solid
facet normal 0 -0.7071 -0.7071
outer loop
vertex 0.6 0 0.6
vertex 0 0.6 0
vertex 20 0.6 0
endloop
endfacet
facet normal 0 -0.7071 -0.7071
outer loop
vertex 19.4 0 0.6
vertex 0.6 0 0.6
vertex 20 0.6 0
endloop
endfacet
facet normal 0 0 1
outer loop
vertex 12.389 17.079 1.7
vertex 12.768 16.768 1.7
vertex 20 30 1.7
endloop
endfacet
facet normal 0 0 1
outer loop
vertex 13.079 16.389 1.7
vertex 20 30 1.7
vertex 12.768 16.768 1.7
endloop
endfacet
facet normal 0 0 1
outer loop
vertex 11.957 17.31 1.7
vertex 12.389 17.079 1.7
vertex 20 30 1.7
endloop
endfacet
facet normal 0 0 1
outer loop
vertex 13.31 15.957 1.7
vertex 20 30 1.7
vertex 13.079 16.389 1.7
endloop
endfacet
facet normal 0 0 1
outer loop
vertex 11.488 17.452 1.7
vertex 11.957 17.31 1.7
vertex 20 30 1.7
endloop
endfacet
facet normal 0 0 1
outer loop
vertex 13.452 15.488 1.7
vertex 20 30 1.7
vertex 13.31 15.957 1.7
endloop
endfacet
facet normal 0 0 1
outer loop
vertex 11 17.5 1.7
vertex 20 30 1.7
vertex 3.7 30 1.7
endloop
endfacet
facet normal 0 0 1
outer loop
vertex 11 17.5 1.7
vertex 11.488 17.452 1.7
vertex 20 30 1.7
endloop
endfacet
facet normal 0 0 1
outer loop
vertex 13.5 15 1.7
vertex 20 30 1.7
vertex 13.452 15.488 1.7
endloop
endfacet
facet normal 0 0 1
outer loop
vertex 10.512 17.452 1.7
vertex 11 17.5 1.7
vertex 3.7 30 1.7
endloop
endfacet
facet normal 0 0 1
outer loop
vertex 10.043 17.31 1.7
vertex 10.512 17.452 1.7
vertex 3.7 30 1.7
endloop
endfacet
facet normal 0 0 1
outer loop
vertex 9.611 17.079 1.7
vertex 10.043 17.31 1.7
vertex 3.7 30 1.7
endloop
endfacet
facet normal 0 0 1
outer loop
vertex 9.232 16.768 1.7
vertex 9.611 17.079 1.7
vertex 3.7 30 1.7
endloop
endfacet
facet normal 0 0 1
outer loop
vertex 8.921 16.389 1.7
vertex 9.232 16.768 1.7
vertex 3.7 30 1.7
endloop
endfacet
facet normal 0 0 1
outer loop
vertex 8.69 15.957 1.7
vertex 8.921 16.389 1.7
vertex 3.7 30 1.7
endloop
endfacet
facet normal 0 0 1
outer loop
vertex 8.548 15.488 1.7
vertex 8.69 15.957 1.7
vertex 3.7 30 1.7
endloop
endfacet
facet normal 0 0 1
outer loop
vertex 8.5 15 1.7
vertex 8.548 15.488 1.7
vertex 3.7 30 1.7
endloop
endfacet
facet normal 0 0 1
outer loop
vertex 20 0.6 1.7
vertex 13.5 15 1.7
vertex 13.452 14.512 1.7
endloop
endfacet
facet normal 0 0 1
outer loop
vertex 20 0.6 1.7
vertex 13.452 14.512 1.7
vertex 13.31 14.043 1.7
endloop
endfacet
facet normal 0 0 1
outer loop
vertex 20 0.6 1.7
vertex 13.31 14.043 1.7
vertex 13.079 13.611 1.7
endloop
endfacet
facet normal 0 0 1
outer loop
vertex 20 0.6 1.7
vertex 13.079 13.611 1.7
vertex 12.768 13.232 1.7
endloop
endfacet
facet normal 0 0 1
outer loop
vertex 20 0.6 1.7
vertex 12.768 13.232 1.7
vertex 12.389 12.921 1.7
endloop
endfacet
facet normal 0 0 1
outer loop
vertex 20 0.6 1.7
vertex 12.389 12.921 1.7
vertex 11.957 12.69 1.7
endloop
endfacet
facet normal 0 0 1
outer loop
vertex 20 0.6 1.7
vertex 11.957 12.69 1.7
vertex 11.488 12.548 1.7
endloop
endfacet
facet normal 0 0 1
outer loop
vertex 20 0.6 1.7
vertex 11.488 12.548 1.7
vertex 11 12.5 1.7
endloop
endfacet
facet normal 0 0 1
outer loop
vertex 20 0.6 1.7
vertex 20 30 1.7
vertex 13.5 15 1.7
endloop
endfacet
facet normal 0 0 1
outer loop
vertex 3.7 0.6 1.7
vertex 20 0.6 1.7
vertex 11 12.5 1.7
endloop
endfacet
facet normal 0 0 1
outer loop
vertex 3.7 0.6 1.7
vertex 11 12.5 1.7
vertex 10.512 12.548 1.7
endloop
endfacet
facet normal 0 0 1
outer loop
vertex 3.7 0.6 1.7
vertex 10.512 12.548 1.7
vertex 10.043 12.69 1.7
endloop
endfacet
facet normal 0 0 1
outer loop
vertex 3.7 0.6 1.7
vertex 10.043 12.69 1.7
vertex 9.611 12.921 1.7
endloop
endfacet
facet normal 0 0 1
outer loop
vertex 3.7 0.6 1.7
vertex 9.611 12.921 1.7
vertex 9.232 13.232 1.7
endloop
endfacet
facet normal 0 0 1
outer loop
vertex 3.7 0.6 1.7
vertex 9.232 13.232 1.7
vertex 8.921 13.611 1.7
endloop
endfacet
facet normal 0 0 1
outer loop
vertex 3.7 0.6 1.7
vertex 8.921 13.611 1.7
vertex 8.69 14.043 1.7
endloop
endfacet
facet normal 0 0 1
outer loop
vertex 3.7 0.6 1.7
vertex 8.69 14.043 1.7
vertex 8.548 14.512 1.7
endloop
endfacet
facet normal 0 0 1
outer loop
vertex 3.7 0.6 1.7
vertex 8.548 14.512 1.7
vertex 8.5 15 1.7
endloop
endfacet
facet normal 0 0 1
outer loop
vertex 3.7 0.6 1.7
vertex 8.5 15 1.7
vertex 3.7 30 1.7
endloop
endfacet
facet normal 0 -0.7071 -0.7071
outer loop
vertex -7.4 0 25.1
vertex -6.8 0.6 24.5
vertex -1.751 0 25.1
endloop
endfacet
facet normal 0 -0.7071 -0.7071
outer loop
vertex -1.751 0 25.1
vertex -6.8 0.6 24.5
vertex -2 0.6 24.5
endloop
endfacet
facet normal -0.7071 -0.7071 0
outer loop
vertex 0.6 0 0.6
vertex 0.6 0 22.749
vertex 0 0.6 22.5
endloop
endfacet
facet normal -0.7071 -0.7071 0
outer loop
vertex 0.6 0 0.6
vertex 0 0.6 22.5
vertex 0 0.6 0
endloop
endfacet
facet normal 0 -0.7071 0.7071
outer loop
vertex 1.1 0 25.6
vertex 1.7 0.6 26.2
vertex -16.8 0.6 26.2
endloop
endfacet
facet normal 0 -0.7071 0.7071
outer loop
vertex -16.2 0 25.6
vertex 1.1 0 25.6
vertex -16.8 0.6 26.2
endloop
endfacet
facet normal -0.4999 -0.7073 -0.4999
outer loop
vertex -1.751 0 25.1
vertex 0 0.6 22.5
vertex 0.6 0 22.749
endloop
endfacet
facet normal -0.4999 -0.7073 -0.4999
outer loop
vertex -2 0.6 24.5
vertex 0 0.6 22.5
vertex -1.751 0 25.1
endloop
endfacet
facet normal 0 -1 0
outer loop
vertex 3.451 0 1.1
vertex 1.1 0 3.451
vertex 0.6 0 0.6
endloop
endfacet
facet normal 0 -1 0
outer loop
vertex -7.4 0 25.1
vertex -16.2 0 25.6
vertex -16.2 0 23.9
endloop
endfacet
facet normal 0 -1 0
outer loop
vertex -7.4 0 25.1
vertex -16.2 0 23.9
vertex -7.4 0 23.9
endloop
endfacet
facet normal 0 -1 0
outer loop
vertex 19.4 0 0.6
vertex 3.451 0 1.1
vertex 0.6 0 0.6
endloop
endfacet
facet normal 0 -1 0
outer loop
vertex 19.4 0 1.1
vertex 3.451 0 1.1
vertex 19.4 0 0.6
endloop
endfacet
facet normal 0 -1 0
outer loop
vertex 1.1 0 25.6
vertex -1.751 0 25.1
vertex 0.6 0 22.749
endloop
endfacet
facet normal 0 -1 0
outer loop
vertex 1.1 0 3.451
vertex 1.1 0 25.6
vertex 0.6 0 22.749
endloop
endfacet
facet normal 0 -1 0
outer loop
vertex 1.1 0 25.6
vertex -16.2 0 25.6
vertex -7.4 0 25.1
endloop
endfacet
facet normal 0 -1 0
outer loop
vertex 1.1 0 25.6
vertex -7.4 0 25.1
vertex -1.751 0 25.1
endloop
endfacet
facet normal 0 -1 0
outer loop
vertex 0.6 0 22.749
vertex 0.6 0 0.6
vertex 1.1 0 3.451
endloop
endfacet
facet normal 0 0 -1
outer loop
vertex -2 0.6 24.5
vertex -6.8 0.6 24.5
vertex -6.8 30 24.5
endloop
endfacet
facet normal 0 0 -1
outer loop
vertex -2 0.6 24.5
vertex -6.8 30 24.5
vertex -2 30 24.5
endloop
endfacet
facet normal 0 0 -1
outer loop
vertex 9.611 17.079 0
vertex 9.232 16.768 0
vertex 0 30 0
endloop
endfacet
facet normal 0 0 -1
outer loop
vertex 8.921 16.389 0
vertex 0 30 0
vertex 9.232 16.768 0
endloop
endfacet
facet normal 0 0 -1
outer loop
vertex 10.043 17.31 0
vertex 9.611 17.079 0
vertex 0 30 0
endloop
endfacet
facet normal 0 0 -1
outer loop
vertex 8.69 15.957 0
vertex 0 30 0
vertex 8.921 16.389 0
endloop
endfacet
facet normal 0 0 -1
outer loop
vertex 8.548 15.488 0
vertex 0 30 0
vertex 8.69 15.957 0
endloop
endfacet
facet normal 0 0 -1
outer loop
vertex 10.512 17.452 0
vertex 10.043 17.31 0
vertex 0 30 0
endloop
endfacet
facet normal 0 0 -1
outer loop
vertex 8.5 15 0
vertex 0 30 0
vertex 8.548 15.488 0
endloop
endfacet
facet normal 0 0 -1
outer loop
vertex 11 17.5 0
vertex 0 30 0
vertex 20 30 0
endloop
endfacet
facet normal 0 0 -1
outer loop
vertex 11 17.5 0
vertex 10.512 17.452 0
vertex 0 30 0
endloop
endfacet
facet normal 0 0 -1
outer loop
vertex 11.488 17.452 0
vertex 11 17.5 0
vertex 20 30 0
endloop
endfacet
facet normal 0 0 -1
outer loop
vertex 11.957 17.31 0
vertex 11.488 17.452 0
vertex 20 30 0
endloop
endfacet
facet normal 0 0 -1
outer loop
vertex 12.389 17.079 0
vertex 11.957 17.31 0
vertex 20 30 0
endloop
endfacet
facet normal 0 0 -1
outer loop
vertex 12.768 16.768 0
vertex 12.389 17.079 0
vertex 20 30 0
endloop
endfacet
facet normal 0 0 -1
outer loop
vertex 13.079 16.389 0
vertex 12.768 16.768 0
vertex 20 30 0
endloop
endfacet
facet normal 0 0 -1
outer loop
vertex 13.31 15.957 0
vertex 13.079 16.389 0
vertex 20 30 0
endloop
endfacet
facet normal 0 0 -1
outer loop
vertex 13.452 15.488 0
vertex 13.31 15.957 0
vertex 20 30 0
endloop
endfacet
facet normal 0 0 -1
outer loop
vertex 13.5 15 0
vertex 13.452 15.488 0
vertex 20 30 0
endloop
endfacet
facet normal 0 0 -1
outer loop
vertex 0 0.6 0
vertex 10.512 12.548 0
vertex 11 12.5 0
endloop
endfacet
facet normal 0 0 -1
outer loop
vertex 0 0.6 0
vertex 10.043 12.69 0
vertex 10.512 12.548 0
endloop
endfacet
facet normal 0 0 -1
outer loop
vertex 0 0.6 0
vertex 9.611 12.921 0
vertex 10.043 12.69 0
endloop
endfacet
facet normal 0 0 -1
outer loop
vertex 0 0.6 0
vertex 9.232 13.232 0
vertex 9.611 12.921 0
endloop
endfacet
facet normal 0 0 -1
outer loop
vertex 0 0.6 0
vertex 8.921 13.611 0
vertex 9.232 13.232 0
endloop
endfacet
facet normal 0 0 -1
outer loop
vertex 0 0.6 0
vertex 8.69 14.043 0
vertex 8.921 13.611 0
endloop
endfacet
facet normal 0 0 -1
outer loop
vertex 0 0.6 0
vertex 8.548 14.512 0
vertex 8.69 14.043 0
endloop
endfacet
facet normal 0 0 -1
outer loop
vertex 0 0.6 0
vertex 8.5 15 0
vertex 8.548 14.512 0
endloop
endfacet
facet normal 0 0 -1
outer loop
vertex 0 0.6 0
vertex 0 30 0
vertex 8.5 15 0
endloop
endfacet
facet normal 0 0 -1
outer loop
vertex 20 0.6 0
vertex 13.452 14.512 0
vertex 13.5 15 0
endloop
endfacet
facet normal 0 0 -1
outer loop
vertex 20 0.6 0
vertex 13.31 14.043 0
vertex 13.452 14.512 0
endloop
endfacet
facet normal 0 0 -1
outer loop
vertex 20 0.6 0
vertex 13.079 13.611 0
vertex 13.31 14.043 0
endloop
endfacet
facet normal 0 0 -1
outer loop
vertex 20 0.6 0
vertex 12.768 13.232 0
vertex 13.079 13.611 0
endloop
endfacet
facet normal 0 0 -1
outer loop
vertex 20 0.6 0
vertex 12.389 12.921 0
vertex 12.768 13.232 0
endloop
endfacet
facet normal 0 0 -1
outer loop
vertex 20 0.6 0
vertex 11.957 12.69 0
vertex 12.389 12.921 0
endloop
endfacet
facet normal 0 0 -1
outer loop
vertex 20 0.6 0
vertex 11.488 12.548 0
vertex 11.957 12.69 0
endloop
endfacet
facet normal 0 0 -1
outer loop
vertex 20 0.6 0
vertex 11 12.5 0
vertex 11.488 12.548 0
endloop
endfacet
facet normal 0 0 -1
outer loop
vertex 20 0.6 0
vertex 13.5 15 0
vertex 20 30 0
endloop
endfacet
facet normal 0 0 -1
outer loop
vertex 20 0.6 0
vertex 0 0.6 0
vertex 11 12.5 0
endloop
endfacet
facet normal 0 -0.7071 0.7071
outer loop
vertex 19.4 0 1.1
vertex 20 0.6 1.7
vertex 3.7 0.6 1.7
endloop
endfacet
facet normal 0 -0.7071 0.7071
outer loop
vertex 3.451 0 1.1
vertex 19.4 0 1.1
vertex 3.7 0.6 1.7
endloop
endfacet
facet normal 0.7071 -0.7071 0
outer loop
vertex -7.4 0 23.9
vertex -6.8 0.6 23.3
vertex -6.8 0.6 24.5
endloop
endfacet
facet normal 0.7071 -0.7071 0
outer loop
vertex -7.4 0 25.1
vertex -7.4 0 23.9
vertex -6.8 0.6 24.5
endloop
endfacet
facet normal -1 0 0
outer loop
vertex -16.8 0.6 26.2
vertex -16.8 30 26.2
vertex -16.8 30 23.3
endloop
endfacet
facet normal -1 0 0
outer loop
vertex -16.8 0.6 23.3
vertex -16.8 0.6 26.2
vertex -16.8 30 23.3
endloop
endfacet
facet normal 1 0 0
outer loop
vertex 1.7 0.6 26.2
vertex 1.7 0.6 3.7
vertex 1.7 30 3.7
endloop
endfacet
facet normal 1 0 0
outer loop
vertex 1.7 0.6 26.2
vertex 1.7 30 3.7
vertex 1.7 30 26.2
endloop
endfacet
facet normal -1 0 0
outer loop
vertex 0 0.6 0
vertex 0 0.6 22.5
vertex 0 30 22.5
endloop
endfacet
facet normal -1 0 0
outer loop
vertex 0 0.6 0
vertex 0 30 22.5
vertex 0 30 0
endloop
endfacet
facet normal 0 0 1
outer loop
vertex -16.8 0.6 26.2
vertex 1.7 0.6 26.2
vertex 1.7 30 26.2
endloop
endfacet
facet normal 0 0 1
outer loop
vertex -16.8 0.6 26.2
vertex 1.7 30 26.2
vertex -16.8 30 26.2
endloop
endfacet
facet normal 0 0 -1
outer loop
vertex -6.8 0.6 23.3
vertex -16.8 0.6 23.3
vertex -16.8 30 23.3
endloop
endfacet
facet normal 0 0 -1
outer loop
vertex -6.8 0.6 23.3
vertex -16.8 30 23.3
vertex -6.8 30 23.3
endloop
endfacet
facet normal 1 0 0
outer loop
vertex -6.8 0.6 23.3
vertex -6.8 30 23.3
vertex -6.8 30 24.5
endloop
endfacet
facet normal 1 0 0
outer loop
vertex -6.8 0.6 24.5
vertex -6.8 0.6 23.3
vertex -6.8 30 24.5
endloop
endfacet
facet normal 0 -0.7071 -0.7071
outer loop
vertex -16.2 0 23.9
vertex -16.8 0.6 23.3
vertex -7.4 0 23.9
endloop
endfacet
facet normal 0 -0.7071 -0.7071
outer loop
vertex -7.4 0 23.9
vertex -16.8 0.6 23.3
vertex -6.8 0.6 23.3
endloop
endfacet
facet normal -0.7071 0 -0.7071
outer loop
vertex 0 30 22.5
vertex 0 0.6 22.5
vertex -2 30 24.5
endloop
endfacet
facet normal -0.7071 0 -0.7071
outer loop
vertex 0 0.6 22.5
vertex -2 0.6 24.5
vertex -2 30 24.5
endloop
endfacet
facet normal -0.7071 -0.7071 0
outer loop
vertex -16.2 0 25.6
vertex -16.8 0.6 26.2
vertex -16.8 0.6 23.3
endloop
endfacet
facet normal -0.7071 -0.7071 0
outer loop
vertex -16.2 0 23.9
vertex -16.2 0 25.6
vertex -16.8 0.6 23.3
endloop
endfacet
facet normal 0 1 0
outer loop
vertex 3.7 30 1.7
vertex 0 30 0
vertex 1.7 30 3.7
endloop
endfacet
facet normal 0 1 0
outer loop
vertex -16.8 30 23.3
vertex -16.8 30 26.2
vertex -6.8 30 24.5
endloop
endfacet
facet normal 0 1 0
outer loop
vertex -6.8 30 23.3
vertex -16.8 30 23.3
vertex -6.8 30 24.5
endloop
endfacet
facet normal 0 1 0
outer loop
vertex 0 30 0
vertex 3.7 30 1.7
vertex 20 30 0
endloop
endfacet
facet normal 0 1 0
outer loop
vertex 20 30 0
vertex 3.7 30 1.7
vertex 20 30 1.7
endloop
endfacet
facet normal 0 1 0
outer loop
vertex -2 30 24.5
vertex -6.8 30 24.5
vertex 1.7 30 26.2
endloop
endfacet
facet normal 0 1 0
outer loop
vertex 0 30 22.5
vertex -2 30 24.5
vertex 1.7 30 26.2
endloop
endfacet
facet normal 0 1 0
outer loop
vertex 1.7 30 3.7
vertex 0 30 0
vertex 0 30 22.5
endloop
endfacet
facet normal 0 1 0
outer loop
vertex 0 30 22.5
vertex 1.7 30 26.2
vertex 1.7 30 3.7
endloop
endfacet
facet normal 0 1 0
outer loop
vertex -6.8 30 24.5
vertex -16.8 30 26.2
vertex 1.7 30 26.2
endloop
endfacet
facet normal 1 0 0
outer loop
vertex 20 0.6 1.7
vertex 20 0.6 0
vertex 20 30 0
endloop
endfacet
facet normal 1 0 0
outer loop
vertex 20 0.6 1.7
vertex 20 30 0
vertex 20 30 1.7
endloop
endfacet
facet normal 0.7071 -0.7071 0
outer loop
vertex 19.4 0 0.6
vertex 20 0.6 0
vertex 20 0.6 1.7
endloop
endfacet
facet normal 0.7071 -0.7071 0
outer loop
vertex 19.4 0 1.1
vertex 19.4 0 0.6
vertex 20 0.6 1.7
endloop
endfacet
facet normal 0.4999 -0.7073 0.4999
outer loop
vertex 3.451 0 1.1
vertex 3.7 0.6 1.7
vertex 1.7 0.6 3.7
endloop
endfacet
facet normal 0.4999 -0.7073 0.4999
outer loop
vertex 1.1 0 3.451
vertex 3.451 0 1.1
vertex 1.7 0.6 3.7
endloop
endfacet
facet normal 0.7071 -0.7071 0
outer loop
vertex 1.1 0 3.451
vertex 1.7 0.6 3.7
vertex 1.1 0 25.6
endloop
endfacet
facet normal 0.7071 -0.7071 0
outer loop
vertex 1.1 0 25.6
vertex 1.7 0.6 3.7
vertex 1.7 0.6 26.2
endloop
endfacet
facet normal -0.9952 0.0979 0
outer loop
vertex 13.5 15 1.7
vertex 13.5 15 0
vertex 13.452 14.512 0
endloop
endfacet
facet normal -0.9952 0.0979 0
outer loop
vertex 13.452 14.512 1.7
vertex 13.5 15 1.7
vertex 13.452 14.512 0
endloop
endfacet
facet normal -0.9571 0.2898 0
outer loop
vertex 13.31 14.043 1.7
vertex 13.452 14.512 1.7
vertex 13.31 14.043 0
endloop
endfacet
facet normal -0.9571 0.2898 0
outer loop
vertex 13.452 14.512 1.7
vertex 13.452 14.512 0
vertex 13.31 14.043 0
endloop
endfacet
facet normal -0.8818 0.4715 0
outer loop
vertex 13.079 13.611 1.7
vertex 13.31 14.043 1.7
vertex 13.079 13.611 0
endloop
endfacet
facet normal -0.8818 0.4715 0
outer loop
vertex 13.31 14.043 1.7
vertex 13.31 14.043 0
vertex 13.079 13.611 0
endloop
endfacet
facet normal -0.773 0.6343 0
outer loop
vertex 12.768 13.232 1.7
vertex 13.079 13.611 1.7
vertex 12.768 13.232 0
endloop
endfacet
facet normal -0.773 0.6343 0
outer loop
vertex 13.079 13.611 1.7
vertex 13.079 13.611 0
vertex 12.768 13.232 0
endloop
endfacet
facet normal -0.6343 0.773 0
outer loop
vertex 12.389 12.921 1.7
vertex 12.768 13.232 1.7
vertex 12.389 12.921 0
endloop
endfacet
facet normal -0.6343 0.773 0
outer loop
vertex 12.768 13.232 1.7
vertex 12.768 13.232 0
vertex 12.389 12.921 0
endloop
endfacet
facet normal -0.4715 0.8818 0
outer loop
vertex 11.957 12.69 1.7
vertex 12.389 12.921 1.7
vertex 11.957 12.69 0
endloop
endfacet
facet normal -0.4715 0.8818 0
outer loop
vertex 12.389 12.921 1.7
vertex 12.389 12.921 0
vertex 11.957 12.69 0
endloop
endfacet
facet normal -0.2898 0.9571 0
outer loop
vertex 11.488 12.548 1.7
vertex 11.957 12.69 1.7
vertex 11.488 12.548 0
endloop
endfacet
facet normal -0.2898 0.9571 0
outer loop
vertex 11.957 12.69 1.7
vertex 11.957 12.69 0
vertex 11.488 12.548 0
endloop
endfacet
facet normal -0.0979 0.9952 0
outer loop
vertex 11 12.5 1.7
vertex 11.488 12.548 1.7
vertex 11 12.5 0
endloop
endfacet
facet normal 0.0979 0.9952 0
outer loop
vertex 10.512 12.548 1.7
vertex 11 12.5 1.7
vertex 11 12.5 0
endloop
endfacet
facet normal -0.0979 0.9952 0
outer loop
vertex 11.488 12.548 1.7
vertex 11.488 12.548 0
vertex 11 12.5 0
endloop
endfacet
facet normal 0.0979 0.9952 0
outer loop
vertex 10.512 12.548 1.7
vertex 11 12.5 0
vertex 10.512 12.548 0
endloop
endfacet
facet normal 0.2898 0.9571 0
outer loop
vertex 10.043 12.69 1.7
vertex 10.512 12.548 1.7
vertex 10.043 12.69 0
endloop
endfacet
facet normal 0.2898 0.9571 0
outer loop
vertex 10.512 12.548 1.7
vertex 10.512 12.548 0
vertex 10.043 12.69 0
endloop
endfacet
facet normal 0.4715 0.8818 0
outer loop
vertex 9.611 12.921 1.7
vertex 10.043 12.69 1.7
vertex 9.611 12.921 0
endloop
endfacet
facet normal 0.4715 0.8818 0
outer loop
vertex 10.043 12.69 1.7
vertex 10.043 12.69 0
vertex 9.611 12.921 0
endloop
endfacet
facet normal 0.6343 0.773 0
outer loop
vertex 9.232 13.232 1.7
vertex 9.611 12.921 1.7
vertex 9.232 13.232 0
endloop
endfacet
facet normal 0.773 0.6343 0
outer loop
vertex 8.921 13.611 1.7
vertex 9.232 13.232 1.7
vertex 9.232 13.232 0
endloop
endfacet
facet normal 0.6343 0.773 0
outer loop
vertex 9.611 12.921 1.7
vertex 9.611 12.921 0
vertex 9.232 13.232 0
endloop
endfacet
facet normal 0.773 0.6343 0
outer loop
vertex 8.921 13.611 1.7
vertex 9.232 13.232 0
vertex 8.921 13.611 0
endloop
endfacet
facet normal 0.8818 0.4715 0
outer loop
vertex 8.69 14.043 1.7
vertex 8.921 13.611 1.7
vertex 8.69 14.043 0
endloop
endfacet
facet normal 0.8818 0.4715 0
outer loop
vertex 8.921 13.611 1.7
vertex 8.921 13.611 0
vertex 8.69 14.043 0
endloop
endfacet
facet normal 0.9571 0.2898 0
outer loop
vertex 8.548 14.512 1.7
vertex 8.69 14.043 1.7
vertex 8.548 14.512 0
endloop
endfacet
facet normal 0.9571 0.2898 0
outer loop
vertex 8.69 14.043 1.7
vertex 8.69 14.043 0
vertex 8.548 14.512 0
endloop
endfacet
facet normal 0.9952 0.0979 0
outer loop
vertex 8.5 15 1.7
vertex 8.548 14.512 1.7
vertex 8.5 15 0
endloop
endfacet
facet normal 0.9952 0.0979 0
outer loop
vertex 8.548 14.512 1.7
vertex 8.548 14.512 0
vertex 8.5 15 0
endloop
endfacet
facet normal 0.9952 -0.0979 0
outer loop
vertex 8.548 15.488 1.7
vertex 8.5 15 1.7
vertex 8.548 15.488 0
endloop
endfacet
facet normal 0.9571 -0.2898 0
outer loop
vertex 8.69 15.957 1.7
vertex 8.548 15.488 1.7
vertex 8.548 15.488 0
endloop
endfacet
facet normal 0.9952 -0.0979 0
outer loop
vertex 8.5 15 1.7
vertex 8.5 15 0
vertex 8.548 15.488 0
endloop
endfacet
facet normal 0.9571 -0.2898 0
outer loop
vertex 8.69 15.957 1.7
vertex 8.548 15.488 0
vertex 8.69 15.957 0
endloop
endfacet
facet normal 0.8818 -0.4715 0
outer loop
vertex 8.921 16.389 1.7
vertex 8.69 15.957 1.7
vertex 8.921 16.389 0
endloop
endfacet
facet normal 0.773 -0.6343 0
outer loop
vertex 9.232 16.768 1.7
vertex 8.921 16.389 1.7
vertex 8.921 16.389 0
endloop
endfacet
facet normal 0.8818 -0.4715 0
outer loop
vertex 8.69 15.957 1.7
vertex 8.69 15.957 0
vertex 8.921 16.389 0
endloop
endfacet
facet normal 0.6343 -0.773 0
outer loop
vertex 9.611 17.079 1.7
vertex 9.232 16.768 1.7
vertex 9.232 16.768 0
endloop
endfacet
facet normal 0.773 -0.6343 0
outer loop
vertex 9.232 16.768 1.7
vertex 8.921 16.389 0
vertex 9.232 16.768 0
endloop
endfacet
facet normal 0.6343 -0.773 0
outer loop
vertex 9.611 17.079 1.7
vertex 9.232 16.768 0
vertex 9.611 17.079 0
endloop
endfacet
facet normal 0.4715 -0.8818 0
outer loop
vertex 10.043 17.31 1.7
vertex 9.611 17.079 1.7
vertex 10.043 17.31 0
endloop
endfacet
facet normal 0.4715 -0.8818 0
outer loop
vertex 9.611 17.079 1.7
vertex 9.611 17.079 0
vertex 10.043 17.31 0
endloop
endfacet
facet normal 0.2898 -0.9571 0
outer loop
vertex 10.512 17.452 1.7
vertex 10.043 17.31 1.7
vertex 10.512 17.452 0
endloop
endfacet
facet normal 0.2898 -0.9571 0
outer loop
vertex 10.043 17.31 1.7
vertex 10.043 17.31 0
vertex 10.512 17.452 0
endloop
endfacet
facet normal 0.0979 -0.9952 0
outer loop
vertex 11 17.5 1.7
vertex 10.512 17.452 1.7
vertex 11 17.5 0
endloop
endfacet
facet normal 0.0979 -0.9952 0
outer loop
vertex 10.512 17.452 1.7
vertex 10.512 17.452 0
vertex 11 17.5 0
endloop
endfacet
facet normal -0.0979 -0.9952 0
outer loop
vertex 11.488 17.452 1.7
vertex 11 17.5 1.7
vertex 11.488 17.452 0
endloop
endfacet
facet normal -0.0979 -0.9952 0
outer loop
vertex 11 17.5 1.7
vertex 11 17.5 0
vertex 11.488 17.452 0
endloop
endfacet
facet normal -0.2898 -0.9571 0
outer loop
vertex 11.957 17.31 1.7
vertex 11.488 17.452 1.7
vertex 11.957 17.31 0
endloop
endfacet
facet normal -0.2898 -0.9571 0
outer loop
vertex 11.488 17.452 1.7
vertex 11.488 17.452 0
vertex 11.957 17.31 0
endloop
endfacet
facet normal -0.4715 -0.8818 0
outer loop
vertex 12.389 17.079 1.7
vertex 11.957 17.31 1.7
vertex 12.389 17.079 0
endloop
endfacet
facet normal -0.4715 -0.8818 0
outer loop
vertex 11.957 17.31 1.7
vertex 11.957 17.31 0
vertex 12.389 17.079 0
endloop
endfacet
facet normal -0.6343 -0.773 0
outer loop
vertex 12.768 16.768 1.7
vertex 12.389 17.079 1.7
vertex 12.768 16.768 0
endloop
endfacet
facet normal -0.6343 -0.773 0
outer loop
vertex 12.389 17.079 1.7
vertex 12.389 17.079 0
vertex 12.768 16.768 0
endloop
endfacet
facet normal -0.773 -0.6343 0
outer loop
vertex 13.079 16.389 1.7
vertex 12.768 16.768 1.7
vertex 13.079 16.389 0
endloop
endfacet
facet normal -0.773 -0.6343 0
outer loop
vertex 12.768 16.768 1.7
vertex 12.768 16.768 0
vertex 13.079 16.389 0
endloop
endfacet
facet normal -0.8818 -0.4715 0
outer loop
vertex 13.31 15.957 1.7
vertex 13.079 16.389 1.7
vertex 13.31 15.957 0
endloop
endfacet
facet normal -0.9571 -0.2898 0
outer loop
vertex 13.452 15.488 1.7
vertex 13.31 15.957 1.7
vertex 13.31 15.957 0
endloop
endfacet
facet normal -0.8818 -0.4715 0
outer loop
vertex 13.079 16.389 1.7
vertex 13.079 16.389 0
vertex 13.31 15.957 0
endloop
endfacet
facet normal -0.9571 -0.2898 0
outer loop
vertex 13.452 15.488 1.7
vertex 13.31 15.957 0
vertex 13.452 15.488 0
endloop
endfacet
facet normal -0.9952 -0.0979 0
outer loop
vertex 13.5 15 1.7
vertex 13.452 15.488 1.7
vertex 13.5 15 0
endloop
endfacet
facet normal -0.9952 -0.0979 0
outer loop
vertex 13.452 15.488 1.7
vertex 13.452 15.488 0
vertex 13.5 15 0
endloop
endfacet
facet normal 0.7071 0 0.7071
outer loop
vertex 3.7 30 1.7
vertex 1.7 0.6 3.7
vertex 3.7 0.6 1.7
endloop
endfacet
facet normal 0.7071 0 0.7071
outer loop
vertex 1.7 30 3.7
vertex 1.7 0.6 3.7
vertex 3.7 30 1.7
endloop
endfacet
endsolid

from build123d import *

# Parameters (mm, degrees)
F1_DEPTH = 30
F2_SIZE  = 2
F3_SIZE  = 0.6
F4_R     = 2.5
F5_DEPTH = 1.7


with BuildPart() as f1:
    # F0 (on Front) → F1 (new body)
    with BuildSketch(Plane.XZ):
        Polygon((0, 24.5), (0, 0), (20, 0), (20, 1.7), (1.7, 1.7), (1.7, 26.2), (-16.8, 26.2), (-16.8, 23.3), (-6.8, 23.3), (-6.8, 24.5), align=None)
    extrude(amount=-F1_DEPTH)

    # F2
    f2_edges = [f1.edges().sort_by_distance(p)[0] for p in [
        (1.7, 15, 1.7),
        (0, 15, 24.5),
    ]]
    chamfer(f2_edges, length=F2_SIZE)

    # F3
    f3_edges = [f1.edges().sort_by_distance(p)[0] for p in [
        (1.7, 0, 14.95),
        (2.7, 0, 2.7),
        (-7.55, 0, 26.2),
        (11.85, 0, 1.7),
        (-16.8, 0, 24.75),
        (20, 0, 0.85),
        (-11.8, 0, 23.3),
        (10, 0, 0),
        (-6.8, 0, 23.9),
        (0, 0, 11.25),
        (-4.4, 0, 24.5),
        (-1, 0, 23.5),
    ]]
    chamfer(f3_edges, length=F3_SIZE)

    # F4 (on face) → F5 (cut, through all)
    with BuildSketch(Plane(origin=(0, 0, 0), x_dir=(1, 0, 0), z_dir=(0, 0, -1))):
        with Locations((11, -15)):
            Circle(F4_R)
    extrude(amount=-F5_DEPTH, mode=Mode.SUBTRACT)


solid = f1.part
